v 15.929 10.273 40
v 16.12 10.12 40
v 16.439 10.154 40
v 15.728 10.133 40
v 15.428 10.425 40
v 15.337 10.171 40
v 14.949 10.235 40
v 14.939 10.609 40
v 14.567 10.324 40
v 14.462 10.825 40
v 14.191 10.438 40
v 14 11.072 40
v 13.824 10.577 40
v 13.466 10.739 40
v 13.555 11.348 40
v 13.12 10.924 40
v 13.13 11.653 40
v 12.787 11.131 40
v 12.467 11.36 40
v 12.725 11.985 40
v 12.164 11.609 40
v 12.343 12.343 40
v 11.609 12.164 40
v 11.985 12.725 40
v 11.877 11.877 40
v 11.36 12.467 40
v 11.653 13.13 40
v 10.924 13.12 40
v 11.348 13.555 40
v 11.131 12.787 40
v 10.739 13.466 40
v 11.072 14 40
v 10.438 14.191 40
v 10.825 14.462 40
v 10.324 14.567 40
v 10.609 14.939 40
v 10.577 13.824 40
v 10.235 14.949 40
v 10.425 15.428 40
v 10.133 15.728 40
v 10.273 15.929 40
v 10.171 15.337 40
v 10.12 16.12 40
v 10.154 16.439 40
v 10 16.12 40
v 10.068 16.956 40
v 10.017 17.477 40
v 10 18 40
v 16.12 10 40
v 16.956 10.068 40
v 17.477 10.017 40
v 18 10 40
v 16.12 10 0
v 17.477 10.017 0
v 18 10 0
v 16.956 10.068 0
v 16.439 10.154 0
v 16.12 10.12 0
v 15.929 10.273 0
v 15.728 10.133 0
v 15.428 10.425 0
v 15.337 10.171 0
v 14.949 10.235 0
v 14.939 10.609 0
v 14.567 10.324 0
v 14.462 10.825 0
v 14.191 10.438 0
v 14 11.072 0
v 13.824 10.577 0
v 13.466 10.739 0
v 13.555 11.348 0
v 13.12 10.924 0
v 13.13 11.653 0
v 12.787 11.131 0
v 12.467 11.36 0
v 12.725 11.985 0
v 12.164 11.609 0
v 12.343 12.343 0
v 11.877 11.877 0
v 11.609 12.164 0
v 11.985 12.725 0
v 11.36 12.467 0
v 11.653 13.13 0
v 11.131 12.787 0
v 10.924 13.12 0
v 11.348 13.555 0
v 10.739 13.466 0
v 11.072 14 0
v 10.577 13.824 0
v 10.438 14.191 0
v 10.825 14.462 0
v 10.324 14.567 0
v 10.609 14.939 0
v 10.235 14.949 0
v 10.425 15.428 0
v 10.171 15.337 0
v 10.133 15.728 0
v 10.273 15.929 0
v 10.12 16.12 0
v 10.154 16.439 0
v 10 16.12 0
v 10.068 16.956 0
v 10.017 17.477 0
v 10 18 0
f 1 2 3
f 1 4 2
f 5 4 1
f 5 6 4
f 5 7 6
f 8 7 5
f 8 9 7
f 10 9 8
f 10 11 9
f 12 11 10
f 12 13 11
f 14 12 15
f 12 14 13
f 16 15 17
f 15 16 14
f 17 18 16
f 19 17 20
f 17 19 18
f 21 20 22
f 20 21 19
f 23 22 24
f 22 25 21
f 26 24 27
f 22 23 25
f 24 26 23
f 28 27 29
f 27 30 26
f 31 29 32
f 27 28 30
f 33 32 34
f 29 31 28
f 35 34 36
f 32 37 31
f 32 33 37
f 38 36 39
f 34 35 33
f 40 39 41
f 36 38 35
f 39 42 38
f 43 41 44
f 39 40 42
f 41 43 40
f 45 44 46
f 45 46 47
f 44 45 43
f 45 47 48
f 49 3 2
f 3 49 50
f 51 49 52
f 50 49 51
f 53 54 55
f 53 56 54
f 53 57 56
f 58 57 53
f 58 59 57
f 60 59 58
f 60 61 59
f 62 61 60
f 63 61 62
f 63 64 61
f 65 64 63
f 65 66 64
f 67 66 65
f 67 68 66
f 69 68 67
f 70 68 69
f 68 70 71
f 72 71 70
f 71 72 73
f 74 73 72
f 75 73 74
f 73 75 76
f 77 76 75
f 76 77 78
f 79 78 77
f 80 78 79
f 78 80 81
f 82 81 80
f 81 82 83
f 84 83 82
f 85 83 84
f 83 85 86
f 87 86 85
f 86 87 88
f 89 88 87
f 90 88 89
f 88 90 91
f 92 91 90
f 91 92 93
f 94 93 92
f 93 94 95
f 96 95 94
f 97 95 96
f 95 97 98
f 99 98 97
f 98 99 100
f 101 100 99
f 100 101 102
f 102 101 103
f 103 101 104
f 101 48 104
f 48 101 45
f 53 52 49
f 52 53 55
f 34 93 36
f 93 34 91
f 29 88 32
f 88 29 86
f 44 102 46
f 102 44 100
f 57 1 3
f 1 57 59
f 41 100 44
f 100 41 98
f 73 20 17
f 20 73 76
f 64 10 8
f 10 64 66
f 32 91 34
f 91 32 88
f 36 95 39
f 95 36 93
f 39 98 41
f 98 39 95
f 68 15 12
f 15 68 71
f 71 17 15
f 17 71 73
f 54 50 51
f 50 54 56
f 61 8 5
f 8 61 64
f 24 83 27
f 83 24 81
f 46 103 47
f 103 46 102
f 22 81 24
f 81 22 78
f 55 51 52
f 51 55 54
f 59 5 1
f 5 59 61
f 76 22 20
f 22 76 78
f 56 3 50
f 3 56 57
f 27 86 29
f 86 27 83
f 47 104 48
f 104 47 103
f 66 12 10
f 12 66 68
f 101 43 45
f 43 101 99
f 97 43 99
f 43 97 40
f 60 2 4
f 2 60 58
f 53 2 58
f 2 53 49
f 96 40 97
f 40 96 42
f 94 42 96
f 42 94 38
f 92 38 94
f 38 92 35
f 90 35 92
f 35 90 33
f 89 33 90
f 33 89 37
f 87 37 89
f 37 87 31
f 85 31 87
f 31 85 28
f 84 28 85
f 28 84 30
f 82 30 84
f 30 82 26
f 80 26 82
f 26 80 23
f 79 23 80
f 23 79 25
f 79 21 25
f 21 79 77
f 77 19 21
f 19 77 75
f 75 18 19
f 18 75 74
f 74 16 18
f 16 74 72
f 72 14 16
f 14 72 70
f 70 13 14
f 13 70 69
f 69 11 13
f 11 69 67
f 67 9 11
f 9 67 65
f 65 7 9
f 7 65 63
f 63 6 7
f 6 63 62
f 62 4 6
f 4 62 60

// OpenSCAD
// file: ../fillet-visual-tests/_fillet_ref.scad
// -----------------------------------------------------------------------------
// M1 visual harness — shared reference tools + cross-cut viewer
//
// These are HAND-WRITTEN reference fillet/round/chamfer tools built from the
// classic OpenSCAD idioms (annulus - torus, wedge - cylinder, ...). They do NOT
// depend on the fillet_tool/round_tool nodes, so they render today and give the
// known-good target that later milestones (M5, M7) must reproduce.
//
// Convention for every case: geometry is built so the feature EDGE runs along Z,
// and we take a thin-slab horizontal cross-section (normal +Z). One image then
// shows, side by side along X:
//     [ base model ] [ applied result ] [ isolated tool solid ]
// and, stacked along Y, a small radius and a large radius (>= surface extent).
// -----------------------------------------------------------------------------

// Thin-slab section: intersect children with a thin horizontal slab at height z.
// XY size is deliberately huge so it covers the whole laid-out scene; only z and
// thickness matter for what the section shows.
module fillet_section(z = 0, thickness = 0.6, extent = 4000) {
  intersection() {
    children();
    translate([0, 0, z]) cube([extent, extent, thickness], center = true);
  }
}

// Vertical thin-slab section (normal +Y), for axis-symmetric ring features where
// a cut through the axis shows the rho-z profile and the ring fillet on both sides.
module fillet_vsection(y = 0, thickness = 0.6, extent = 4000) {
  intersection() {
    children();
    translate([0, y, 0]) cube([extent, thickness, extent], center = true);
  }
}

// Stack several thin-slab sections at different heights, translated apart along
// +Y so the section EVOLVING toward a junction is visible at a glance (used for
// the 3-/4-face meeting-point cases).
module fillet_contour_stack(zs, thickness = 0.6, spacing = 90, extent = 4000) {
  for (i = [0 : len(zs) - 1])
    translate([0, i * spacing, 0])
      fillet_section(z = zs[i], thickness = thickness, extent = extent)
        children();
}

// ---- reference tools for a single 90-degree edge running along Z -------------

// Inner (concave) fillet bead. Faces are x = cx (material x < cx) and y = cy
// (material y < cy); the reentrant quadrant opens toward +x,+y. Union this with
// the model. Cross-section = corner square minus a quarter disc (= a fillet).
module ref_fillet_edge_z(cx, cy, r, h, z0 = 0) {
  translate([0, 0, z0])
    difference() {
      translate([cx, cy, 0]) cube([r, r, h]);
      translate([cx + r, cy + r, -1]) cylinder(r = r, h = h + 2);
    }
}

// Outer (convex) round tool. Convex corner at (cx,cy), material x < cx & y < cy.
// SUBTRACT this from the model; it is the sharp corner sliver outside the arc.
module ref_round_edge_z(cx, cy, r, h, z0 = 0) {
  translate([0, 0, z0])
    difference() {
      translate([cx - r, cy - r, 0]) cube([r, r, h]);
      translate([cx - r, cy - r, -1]) cylinder(r = r, h = h + 2);
    }
}

// Inner (concave) chamfer bead — the wedge alone, no arc. Union with the model.
module ref_chamfer_edge_z(cx, cy, t, h, z0 = 0) {
  translate([0, 0, z0])
    linear_extrude(h)
      polygon([[cx, cy], [cx + t, cy], [cx, cy + t]]);
}
// file: _fillet_test.scad
// -----------------------------------------------------------------------------
// M6-prep — automated equivalence harness (see ../detailed-milestones.md, M6)
//
// Proves two solids are the SAME shape to within a tolerance t, tessellation-
// independently. Used to check a fillet operator's output against the hand-
// written reference in ../fillet-visual-tests/_fillet_ref.scad.
//
// Idea (equivalence-by-emptiness): an exact symmetric difference is never empty,
// because the operator tessellates arcs differently from the reference. So we
// test two-sided containment after dilating each side by t:
//
//     (candidate - dilate(reference, t))  is empty   AND
//     (reference - dilate(candidate, t))  is empty
//
// <=> Hausdorff(candidate, reference) < t. Pick t above the arc chord error
// (~0.004*r at $fa=12) and below the smallest real defect worth catching.
//
// PASS condition is machine-detectable: when the union below is EMPTY, OpenSCAD
// prints "Current top level object is empty." and exits 1. check_equivalence.sh
// turns that into a passing test. A real error (wrong radius/shape, missing
// corner, gouge) exceeds t and leaves a shell -> non-empty -> failing test.
// -----------------------------------------------------------------------------

// L-infinity dilation by t (a cube "ball"): cheap, and enough to swallow the
// thin slivers between two tessellations of the same surface.
module fillet_dilate(t) minkowski() { children(); cube(2 * t, center = true); }

// children(0) = candidate (the operator tool), children(1) = reference tool.
// Renders empty iff the two agree to within t.
module fillet_equivalence(t) {
  union() {
    difference() { children(0); fillet_dilate(t) children(1); }
    difference() { children(1); fillet_dilate(t) children(0); }
  }
}
// main file
// Self-test (negative): candidate uses r=8, reference r=6. A genuine shape
// error far larger than t. The harness must report NON-EMPTY -> FAIL. This
// proves the check actually catches wrong geometry (i.e. it is not always PASS).

use <_fillet_test.scad>;
use <../fillet-visual-tests/_fillet_ref.scad>;

H = 40;
t = 0.02 * 6;

module candidate() ref_fillet_edge_z(10, 10, 8, H, $fn = 96);   // wrong radius
module reference() ref_fillet_edge_z(10, 10, 6, H, $fn = 96);

fillet_equivalence(t) { candidate(); reference(); }
